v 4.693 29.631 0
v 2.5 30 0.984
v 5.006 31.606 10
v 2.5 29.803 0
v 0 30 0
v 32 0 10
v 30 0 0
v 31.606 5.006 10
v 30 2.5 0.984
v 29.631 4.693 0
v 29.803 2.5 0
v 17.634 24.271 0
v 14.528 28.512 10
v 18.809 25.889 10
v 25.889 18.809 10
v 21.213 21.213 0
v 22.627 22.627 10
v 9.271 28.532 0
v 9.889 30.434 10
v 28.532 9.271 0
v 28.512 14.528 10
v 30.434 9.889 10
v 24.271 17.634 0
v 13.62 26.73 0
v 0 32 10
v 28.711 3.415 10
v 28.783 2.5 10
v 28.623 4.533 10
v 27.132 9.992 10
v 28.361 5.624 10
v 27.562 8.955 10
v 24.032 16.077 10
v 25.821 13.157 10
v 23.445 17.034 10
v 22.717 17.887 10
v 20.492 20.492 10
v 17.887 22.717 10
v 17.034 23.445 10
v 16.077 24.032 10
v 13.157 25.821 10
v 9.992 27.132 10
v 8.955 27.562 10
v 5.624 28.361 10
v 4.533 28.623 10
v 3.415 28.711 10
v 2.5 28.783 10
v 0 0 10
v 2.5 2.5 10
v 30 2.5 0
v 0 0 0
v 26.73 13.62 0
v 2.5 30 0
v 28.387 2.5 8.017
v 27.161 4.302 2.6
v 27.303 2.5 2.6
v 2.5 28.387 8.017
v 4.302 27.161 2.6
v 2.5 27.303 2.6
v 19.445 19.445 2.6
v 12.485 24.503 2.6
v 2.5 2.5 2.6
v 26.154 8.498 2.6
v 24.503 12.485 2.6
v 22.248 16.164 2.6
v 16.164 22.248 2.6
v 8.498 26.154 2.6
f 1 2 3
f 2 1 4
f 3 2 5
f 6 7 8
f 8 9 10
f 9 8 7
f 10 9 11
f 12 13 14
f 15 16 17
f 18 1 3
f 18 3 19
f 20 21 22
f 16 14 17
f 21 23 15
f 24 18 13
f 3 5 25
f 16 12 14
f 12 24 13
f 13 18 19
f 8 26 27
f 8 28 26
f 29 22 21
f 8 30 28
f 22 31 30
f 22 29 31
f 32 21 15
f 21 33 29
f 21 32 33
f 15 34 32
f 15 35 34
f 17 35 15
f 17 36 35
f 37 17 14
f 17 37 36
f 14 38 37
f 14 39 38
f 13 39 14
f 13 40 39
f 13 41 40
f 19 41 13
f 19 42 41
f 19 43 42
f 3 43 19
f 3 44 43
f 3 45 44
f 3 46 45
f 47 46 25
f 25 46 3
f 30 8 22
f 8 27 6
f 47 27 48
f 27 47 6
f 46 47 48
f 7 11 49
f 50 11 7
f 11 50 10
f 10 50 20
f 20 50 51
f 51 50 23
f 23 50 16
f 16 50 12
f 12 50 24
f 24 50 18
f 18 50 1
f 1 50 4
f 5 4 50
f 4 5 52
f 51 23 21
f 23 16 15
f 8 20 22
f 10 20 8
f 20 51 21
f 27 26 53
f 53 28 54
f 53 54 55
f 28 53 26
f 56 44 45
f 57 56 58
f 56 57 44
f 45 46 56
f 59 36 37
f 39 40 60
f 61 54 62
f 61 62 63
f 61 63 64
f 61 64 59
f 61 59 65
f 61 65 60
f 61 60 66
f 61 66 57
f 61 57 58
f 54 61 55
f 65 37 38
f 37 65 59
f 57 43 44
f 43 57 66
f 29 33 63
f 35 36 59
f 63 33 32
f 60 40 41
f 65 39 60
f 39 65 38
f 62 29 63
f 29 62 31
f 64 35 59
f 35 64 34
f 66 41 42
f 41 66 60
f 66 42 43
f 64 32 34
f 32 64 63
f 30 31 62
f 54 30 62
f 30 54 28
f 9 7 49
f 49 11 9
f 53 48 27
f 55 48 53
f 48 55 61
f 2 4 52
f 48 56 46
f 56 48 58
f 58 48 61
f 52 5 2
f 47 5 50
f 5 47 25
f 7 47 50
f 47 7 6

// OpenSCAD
out_r1 = 30;
out_r2 = 32;
thickn = 2.5;
height = 10;

module bathroomsink() 
{
    $fn=40;
    color("LightSteelBlue") intersection() {
        union() {
            difference() {
                cylinder(r1 = out_r1, 
                    r2 = out_r2, h=height); 
                translate([0,0,thickn+0.1]) 
                cylinder(r1 = out_r1 - thickn, 
                    r2 = out_r2 - thickn, height); 
            }
    
           
            translate([0,0,height/2]) {
                cube([2 * out_r1, 2*thickn, height], center=true);
                cube([2*thickn, 2 * out_r1, height], center=true);
            }
        }
        translate([0,0,-1]) cube([out_r2, out_r2, 2*height]);
    }
}

bathroomsink();
